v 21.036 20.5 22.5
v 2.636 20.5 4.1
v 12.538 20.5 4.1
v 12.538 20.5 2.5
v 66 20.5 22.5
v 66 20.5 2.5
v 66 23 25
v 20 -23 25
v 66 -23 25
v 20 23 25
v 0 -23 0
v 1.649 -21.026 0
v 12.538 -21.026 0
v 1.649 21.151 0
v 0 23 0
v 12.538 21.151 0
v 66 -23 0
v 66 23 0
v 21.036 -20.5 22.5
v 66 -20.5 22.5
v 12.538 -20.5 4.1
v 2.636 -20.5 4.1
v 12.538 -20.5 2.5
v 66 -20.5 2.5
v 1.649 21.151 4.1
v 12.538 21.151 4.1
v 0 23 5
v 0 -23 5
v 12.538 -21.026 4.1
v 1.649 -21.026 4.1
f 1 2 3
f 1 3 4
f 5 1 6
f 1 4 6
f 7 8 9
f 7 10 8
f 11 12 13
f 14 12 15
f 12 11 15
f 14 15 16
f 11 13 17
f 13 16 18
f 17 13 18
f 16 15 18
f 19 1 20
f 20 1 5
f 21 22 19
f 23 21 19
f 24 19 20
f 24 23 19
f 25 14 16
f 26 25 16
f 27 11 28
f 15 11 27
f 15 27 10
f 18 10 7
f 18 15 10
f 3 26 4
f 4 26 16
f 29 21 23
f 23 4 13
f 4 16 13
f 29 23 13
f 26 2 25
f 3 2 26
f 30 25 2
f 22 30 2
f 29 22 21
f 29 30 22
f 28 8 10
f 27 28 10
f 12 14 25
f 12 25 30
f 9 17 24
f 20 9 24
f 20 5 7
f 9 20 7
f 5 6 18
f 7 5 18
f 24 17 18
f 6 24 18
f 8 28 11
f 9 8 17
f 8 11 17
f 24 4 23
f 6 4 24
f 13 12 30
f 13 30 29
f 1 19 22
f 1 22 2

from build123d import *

# Parameters (mm, degrees)
F0_W     = 66
F0_H     = 46
F1_DEPTH = 25
F2_SIZE  = 20
F3_T     = -2.5
F4_W     = 10.88829
F4_H     = 42.176487
F5_DEPTH = 4.1


with BuildPart() as f1:
    # F0 (on Top) → F1 (new body)
    with BuildSketch(Plane.XY):
        with Locations((33, 0)):
            Rectangle(F0_W, F0_H)
    extrude(amount=F1_DEPTH)

    # F2
    f2_edges = [f1.edges().sort_by_distance(p)[0] for p in [
        (0, 0, 25),
    ]]
    chamfer(f2_edges, length=F2_SIZE)

    # F3
    f3_openings = [f1.faces().sort_by_distance(p)[0] for p in [
        (66, 0, 12.5),
    ]]
    offset(amount=F3_T, openings=f3_openings)

    # F4 (on face) → F5 (cut)
    with BuildSketch(Plane(origin=(0, 0, 0), x_dir=(1, 0, 0), z_dir=(0, 0, -1))):
        with Locations((7.093375, -0.062578)):
            Rectangle(F4_W, F4_H)
    extrude(amount=-F5_DEPTH, mode=Mode.SUBTRACT)


solid = f1.part
